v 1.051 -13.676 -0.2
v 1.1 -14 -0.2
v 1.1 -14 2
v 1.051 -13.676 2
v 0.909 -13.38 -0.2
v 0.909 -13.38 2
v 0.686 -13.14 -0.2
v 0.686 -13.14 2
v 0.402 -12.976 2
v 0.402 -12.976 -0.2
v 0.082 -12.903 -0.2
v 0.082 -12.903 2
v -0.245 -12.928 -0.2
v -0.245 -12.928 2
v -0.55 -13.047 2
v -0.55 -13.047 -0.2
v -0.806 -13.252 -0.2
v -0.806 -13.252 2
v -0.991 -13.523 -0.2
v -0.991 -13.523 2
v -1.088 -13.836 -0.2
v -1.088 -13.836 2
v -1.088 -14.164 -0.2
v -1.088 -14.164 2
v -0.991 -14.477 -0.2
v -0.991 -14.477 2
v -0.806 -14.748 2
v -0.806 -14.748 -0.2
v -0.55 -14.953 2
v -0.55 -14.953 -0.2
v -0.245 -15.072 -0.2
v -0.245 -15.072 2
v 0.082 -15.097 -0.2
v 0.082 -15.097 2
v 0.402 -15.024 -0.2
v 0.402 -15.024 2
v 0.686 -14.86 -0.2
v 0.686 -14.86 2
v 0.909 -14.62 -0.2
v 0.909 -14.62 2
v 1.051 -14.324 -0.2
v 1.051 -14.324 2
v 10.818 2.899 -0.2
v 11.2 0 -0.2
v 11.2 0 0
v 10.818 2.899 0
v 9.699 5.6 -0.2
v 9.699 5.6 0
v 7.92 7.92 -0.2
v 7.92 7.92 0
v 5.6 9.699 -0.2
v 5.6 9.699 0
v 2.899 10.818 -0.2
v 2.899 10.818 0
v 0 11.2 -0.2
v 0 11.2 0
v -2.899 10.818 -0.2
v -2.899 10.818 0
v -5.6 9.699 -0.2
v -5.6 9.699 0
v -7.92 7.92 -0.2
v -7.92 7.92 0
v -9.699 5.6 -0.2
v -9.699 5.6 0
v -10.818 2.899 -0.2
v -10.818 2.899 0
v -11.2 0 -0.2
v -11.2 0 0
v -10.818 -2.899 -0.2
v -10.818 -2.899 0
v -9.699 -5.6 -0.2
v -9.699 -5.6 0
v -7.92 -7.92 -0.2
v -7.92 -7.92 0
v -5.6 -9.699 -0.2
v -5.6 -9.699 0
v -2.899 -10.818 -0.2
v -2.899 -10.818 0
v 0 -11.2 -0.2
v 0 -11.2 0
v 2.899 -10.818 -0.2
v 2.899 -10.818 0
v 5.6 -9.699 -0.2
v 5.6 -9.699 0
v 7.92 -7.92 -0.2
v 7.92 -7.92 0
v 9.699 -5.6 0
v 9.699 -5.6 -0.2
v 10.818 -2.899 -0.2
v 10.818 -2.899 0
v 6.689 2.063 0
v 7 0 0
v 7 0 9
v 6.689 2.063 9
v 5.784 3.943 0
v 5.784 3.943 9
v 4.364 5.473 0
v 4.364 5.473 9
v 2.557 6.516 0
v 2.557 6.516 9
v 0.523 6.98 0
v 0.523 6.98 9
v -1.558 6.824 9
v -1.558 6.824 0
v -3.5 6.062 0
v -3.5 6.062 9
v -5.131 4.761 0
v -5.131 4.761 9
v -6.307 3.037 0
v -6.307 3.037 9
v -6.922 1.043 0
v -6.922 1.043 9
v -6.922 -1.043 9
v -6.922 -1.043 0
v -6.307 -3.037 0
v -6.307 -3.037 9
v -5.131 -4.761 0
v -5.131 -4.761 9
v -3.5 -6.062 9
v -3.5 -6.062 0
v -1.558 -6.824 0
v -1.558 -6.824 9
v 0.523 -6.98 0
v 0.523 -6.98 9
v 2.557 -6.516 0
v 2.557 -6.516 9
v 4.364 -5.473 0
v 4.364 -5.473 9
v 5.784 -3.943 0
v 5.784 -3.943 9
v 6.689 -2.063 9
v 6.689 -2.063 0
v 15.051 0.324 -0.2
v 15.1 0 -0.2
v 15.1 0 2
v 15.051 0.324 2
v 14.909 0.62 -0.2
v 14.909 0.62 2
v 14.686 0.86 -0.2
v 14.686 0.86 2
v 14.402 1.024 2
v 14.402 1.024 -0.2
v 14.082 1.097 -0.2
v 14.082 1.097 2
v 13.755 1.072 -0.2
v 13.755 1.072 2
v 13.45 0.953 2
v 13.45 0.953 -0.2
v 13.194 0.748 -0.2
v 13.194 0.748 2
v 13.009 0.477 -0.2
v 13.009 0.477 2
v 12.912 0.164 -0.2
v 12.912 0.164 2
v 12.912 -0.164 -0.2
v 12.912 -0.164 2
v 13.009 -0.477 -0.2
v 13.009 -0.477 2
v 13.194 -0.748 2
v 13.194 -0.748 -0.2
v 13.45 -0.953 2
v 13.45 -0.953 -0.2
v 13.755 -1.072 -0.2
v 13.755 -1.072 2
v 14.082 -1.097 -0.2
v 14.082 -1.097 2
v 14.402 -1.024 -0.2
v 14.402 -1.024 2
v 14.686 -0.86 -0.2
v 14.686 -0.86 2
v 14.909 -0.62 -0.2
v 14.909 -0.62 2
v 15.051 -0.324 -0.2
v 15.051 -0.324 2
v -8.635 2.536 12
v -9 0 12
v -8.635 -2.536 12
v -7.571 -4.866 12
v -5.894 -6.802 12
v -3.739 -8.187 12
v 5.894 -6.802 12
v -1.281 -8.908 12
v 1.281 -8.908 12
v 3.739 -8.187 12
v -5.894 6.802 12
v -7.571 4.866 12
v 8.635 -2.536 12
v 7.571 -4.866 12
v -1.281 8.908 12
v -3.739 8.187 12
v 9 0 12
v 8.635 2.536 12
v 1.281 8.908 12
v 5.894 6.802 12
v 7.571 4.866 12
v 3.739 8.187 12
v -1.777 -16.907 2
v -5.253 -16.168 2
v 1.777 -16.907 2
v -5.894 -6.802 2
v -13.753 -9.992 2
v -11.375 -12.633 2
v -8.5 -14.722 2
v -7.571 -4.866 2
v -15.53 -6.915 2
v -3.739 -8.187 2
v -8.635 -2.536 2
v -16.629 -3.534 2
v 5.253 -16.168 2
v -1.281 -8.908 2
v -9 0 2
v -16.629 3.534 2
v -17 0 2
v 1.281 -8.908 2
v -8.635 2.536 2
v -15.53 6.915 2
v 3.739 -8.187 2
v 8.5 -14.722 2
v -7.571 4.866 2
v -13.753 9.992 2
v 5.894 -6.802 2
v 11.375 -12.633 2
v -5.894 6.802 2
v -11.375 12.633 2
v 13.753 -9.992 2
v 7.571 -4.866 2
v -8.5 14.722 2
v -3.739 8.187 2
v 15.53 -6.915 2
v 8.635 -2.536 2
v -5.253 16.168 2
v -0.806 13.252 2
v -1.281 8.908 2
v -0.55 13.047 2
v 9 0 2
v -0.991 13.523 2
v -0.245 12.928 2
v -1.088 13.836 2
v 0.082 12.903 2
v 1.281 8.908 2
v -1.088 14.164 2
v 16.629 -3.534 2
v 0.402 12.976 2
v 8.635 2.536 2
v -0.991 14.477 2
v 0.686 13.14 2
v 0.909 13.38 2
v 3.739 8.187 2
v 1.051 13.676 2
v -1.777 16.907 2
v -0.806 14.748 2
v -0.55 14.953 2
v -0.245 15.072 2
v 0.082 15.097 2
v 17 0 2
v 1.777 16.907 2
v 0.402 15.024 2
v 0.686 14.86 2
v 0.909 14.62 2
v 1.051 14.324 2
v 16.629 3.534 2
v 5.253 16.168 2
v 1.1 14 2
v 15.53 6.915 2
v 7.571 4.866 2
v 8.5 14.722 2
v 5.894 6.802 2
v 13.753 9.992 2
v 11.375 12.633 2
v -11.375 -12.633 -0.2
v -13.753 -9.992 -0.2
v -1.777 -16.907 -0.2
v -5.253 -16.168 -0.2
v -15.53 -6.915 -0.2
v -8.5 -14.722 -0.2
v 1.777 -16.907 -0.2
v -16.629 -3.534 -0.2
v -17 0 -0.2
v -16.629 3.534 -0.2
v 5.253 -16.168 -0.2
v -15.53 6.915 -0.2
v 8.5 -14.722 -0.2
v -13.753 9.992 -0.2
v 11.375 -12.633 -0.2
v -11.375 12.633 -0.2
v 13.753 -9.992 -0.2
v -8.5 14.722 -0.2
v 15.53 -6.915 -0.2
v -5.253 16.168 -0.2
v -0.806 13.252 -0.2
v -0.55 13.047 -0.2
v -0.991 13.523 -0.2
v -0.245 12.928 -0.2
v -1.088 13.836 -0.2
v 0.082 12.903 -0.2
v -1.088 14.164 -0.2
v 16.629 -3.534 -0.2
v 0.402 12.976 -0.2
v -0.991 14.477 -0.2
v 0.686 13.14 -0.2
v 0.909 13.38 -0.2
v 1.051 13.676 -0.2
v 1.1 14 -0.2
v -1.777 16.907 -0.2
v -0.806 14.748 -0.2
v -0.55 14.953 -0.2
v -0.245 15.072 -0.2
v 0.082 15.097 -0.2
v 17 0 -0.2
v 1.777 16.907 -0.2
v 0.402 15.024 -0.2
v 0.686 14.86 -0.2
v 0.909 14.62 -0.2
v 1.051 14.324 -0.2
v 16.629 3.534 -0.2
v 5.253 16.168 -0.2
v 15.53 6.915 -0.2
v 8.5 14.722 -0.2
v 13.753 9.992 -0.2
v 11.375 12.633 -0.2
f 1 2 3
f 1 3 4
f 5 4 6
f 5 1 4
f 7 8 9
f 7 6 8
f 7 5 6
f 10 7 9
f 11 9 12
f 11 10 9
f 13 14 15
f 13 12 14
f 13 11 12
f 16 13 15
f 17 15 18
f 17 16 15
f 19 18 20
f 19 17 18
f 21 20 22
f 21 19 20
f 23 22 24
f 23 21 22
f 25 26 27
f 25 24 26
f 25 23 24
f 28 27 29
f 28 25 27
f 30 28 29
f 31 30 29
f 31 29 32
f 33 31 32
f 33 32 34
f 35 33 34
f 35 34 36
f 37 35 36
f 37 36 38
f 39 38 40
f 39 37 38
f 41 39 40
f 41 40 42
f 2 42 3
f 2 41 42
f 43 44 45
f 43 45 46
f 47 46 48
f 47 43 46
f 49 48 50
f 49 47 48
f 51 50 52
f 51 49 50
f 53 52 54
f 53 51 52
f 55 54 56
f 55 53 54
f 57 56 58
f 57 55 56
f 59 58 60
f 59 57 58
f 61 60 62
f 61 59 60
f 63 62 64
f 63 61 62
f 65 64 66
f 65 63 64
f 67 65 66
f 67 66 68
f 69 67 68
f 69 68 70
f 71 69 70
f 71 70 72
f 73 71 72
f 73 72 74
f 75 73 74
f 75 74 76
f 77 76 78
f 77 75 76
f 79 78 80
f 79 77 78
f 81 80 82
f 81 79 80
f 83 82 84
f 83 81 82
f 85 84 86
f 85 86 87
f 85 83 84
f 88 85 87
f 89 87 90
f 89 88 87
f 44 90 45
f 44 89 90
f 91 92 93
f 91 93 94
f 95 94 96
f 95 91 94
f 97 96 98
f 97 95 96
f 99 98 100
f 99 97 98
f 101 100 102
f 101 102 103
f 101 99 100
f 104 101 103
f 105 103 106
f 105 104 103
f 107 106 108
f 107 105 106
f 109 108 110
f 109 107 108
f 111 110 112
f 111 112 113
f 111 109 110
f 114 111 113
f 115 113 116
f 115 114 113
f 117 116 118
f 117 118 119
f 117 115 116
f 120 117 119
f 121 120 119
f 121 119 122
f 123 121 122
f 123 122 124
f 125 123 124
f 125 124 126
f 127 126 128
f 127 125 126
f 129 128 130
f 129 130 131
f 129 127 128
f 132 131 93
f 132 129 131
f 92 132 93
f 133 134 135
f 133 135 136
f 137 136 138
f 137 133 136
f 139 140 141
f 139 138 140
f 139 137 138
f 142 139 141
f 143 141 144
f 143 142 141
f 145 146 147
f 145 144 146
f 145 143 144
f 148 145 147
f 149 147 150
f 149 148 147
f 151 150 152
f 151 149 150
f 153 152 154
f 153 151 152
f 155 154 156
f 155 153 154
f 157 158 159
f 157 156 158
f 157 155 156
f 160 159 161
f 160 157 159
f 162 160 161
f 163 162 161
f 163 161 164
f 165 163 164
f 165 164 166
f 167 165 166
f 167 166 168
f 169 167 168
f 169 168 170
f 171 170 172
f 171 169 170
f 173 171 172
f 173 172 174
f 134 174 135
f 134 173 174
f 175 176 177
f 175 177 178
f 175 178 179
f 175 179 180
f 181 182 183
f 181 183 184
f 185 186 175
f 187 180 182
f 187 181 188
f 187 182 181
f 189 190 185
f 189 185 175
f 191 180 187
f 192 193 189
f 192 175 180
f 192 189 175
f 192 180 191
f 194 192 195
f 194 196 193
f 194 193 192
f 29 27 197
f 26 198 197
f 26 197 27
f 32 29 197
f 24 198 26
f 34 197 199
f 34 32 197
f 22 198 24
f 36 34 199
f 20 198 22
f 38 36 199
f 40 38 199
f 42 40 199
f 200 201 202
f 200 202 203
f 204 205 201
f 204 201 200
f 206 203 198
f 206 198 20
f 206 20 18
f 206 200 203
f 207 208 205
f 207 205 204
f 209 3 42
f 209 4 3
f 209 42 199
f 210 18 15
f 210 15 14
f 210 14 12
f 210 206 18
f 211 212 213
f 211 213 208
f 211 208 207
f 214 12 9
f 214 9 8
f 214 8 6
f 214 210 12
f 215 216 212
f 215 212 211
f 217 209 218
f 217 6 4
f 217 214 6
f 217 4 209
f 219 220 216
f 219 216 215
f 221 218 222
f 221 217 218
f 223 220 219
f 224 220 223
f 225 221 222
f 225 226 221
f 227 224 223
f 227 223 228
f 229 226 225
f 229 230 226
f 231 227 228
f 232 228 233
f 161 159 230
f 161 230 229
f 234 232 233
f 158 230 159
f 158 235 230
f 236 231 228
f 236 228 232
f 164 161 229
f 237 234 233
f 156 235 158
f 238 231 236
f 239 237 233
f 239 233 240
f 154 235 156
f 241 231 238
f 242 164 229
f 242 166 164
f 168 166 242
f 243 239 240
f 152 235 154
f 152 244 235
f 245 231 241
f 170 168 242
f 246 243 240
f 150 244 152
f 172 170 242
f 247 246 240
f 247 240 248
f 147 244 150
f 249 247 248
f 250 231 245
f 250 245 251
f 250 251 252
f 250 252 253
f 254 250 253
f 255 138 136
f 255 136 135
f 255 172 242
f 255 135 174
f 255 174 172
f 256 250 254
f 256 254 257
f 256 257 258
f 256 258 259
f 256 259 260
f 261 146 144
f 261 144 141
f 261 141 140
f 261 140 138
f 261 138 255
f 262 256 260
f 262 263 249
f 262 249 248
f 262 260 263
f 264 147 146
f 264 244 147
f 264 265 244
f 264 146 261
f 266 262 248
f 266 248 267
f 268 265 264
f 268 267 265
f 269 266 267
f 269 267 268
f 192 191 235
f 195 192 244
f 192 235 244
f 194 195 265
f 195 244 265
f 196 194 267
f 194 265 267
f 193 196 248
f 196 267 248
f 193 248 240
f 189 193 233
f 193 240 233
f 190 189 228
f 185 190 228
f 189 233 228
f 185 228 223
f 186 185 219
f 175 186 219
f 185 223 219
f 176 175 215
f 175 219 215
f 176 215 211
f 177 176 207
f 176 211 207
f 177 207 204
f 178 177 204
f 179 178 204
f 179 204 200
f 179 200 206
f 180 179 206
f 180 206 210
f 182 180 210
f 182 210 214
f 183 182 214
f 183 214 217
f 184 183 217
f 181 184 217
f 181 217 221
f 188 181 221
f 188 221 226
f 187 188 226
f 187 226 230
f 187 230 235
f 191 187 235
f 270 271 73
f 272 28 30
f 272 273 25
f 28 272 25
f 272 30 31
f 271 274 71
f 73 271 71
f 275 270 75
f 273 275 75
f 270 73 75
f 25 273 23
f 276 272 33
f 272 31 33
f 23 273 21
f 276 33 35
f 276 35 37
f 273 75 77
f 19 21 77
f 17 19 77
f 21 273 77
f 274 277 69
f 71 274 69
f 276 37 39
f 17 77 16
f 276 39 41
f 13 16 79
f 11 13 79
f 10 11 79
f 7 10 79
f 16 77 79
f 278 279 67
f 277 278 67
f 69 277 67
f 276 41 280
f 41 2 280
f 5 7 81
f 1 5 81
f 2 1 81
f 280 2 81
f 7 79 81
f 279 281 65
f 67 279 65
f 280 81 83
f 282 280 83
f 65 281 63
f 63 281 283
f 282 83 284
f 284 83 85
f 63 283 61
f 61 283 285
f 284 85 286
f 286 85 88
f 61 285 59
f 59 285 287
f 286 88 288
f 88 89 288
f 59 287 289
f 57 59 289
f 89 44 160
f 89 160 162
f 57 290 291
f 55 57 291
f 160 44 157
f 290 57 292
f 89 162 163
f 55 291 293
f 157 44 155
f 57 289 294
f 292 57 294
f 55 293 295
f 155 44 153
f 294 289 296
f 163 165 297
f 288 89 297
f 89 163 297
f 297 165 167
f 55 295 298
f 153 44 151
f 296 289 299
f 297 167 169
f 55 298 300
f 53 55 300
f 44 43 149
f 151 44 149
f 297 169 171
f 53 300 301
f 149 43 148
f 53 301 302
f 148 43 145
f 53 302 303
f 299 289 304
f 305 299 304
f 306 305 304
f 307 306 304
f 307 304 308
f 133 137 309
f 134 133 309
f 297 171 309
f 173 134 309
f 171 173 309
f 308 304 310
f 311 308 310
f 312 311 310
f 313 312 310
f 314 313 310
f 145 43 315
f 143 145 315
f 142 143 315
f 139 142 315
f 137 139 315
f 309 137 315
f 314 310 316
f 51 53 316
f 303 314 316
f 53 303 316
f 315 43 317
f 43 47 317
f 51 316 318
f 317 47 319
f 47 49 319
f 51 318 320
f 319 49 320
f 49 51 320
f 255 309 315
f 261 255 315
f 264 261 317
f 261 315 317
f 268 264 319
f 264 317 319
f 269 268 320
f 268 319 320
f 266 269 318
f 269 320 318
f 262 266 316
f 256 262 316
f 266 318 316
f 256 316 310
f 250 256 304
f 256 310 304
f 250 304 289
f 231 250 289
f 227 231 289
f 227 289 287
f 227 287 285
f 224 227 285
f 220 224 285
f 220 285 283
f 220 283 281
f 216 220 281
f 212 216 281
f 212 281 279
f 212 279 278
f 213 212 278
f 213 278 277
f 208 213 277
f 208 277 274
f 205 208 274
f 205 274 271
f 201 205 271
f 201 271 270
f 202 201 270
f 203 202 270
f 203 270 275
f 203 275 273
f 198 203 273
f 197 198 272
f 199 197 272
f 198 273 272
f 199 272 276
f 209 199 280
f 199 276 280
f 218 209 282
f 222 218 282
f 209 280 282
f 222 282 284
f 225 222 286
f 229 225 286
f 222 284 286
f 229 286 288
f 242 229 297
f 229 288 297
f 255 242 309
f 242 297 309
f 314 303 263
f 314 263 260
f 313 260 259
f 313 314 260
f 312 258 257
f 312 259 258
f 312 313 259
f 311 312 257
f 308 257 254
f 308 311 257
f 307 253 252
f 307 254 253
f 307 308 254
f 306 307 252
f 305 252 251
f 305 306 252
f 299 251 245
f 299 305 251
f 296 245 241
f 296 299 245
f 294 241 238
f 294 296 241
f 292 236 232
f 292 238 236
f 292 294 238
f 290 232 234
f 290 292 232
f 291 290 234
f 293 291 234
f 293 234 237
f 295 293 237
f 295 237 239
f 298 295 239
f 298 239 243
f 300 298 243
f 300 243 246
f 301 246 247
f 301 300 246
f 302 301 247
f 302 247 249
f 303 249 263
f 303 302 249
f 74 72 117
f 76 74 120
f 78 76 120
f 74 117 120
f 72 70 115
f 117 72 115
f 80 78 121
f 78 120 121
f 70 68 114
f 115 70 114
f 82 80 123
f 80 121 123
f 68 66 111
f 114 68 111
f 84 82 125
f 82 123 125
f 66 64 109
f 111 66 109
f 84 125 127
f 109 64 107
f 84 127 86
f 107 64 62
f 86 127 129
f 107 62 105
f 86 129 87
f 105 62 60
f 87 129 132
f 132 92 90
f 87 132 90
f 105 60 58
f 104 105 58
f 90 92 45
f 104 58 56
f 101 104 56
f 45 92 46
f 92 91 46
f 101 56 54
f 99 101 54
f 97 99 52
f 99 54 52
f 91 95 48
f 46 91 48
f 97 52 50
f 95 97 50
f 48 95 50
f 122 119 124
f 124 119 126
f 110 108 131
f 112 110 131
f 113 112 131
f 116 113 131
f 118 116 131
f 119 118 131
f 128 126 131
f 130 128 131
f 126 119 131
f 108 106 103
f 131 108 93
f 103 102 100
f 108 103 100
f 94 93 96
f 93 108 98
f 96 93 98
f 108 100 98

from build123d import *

# Parameters (mm, degrees)
OUTER_RACE_KEEPER_FLANGE_PROFILE_R             = 17
OUTER_RACE_KEEPER_FLANGE_DEPTH                 = 2
HOUSING_CONTACT_RIM_PRESERVES_BEARING_FL_START = -0.2
HOUSING_CONTACT_RIM_PRESERVES_BEARIN_2_R       = 17
HOUSING_CONTACT_RIM_PRESERVES_BEARIN_2_R_2     = 11.2
HOUSING_CONTACT_RIM_PRESERVES_BEARING_FL_DEPTH = 0.2
PIN_END_COVER_PROFILE_R                        = 9
PIN_END_COVER_DEPTH                            = 12
DOWEL_END_FLOAT_POCKET_PROFILE_R               = 7
DOWEL_END_FLOAT_POCKET_DEPTH9_DEPTH            = 9
KEEPER_M2_FASTENERS_START                      = -50
KEEPER_M2_FASTENERS_PROFILE_R                  = 1.1
KEEPER_M2_FASTENERS_DEPTH                      = 77.870057685


with BuildPart() as part:
    # Outer_race_keeper_flange_profile → Outer_race_keeper_flange (new body)
    with BuildSketch(Plane.XY):
        Circle(OUTER_RACE_KEEPER_FLANGE_PROFILE_R)
    extrude(amount=OUTER_RACE_KEEPER_FLANGE_DEPTH)

    # Housing_contact_rim_preserves_bearin 2 → Housing_contact_rim_preserves_bearing_fl (add)
    with BuildSketch(Plane.XY.offset(HOUSING_CONTACT_RIM_PRESERVES_BEARING_FL_START)):
        Circle(HOUSING_CONTACT_RIM_PRESERVES_BEARIN_2_R)
        Circle(HOUSING_CONTACT_RIM_PRESERVES_BEARIN_2_R_2, mode=Mode.SUBTRACT)
    extrude(amount=HOUSING_CONTACT_RIM_PRESERVES_BEARING_FL_DEPTH)

    # Pin_end_cover_profile → Pin_end_cover (add)
    with BuildSketch(Plane.XY):
        Circle(PIN_END_COVER_PROFILE_R)
    extrude(amount=PIN_END_COVER_DEPTH)

    # Dowel_end_float_pocket_profile → Dowel_end_float_pocket_depth9 (cut)
    with BuildSketch(Plane.XY):
        Circle(DOWEL_END_FLOAT_POCKET_PROFILE_R)
    extrude(amount=DOWEL_END_FLOAT_POCKET_DEPTH9_DEPTH, mode=Mode.SUBTRACT)

    # Keeper_M2_fasteners_profile → Keeper_M2_fasteners (cut, through all)
    with BuildSketch(Plane.XY.offset(KEEPER_M2_FASTENERS_START)):
        with Locations((14, 0)):
            Circle(KEEPER_M2_FASTENERS_PROFILE_R)
        with Locations((0, -14)):
            Circle(KEEPER_M2_FASTENERS_PROFILE_R)
        with Locations((0, 14)):
            Circle(KEEPER_M2_FASTENERS_PROFILE_R)
    extrude(amount=KEEPER_M2_FASTENERS_DEPTH, mode=Mode.SUBTRACT)


solid = part.part
